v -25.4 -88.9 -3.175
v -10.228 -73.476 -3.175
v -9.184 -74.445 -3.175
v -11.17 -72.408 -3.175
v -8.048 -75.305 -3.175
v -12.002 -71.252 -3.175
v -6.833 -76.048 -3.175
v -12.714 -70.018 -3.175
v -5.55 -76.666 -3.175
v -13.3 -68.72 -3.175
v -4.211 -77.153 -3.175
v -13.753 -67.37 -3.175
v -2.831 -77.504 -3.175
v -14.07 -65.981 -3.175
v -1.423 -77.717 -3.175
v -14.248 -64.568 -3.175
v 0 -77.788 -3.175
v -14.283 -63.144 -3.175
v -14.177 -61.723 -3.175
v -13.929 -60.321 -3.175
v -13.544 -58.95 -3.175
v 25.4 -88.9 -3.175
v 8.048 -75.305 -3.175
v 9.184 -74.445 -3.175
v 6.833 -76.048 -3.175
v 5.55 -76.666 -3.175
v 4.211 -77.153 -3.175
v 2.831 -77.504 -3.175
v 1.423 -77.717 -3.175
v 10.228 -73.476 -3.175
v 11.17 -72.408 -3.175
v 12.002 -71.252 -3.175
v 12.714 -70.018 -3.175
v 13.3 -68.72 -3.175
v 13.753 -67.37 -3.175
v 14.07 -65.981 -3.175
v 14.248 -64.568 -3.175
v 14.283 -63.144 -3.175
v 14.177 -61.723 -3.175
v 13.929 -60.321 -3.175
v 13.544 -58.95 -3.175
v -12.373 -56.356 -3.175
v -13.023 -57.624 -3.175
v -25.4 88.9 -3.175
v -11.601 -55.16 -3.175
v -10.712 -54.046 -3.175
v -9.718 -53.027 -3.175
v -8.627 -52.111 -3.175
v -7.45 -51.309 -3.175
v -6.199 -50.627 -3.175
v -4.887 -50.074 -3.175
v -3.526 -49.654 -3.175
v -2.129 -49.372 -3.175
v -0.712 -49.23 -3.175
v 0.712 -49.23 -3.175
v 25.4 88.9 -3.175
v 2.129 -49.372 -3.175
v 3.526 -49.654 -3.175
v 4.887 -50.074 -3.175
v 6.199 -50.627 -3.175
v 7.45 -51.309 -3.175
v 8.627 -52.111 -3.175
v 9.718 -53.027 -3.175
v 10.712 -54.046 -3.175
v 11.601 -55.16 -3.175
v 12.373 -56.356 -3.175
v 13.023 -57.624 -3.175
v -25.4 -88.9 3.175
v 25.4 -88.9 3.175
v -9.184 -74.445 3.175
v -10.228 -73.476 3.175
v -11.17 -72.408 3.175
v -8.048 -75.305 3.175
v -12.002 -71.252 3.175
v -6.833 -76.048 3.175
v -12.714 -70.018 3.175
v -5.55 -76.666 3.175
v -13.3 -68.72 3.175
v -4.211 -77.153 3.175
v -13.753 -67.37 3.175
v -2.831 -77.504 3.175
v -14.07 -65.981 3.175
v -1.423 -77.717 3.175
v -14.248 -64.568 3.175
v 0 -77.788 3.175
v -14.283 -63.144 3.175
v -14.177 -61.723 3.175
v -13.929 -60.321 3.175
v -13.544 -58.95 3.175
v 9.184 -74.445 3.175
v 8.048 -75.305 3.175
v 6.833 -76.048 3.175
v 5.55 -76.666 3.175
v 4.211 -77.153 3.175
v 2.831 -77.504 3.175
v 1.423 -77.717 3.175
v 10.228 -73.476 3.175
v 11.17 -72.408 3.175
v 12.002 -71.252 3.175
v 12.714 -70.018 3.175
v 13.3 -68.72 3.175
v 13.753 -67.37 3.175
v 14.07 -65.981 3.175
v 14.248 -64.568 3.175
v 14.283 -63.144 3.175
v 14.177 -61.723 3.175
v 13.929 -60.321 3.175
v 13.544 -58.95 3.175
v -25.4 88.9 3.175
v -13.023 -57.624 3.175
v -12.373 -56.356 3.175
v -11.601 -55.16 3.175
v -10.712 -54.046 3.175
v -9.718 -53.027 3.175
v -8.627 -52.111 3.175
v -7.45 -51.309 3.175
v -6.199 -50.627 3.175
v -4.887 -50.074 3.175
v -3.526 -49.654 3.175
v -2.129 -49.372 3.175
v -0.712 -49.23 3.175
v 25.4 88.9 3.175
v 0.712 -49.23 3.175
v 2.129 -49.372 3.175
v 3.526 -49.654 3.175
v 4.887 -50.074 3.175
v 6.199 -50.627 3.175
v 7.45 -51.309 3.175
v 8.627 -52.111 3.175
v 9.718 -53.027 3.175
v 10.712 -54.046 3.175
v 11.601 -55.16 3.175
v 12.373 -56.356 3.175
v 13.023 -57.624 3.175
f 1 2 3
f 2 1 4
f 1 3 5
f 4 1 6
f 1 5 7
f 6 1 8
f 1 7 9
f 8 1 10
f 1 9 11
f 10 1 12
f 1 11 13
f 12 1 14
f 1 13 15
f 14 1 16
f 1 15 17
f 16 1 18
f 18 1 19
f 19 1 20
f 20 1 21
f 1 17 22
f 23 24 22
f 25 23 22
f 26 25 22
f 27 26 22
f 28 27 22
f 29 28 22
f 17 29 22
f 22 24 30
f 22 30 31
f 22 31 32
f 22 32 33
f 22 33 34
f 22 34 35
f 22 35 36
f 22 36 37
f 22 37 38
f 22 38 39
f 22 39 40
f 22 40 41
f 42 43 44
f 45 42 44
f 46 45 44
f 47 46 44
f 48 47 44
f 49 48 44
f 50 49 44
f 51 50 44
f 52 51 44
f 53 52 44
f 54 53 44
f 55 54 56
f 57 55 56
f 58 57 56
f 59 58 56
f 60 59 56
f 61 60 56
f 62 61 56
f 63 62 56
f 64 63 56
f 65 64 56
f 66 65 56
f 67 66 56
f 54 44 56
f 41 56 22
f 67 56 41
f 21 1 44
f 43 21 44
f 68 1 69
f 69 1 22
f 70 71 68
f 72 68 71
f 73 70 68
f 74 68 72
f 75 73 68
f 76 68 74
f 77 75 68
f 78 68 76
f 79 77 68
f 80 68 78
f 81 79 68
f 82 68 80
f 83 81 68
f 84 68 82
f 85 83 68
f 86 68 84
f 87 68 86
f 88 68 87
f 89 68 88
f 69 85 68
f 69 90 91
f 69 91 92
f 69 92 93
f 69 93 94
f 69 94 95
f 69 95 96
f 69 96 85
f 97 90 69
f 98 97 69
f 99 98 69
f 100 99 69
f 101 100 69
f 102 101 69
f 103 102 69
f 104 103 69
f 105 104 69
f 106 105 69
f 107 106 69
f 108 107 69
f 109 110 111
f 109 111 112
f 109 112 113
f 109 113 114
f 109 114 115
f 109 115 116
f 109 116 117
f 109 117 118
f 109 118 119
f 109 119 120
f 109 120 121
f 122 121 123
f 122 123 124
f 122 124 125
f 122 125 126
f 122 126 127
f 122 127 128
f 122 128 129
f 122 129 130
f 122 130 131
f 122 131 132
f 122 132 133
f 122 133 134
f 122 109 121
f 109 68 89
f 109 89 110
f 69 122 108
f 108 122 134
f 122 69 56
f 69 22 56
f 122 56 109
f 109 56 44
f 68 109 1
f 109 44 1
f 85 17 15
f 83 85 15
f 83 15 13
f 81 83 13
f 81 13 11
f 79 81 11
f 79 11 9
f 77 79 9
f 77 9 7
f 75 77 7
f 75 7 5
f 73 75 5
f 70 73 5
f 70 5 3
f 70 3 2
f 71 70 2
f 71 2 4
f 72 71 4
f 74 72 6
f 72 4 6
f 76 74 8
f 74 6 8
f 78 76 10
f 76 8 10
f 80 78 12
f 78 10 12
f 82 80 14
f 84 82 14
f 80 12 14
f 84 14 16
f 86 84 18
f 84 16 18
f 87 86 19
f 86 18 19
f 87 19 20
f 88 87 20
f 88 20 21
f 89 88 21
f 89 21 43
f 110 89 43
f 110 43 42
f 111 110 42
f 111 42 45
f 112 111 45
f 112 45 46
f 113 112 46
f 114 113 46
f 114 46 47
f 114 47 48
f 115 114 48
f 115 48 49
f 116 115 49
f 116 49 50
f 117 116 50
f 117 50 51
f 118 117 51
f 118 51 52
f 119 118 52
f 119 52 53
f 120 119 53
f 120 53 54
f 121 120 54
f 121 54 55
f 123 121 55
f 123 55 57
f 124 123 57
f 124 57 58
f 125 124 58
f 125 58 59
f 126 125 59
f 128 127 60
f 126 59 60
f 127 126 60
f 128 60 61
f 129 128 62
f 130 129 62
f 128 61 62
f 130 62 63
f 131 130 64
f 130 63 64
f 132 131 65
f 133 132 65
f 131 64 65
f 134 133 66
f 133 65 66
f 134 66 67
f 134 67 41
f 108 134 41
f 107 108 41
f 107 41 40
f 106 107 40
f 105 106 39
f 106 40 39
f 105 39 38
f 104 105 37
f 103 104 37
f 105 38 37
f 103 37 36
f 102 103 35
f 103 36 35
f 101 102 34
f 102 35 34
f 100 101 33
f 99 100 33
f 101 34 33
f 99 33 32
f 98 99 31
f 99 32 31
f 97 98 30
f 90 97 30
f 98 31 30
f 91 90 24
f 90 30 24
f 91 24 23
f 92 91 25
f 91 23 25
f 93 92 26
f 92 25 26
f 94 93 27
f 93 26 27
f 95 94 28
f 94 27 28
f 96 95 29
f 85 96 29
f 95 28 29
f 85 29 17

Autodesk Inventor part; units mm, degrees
ref_plane "YZ Plane" through (0, 0, 0) normal (1, 0, 0) x (0, 1, 0)
ref_plane "XZ Plane" through (0, 0, 0) normal (0, 1, 0) x (-1, 0, 0)
ref_plane "XY Plane" through (0, 0, 0) normal (0, 0, 1) x (1, 0, 0)
sketch "Sketch1" plane through (0, 0, 0) normal (0, 0, 1) x (1, 0, 0)
  line L0 (-25.4, -88.9) -> (25.4, -88.9)
  line L1 (25.4, -88.9) -> (25.4, 88.9)
  line L2 (25.4, 88.9) -> (-25.4, 88.9)
  line L3 (-25.4, 88.9) -> (-25.4, -88.9)
  line L4 (-25.4, -88.9) -> (25.4, 88.9) construction
  line L5 (25.4, -88.9) -> (-25.4, 88.9) construction
  point P0 (0, 0)
  dimension "width" = 50.8
  dimension "length" = 177.8
extrude "Extrusion1" add sketch "Sketch1" along normal mid plane 6.35
sketch "Sketch2" plane through (0, 0, 3.175) normal (0, 0, 1) x (1, 0, 0)
  line L0 (-25.4, -88.9) -> (-25.4, 88.9) construction
  line L1 (-25.4, 88.9) -> (25.4, 88.9) construction
  line L2 (25.4, 88.9) -> (25.4, -88.9) construction
  line L3 (25.4, -88.9) -> (-25.4, -88.9) construction
  point P0 (0, 0)
  point P1 (0, -63.5)
  point P2 (0, -88.9)
  dimension "d4" = 25.4
hole "Hole1" at (0, -63.5, 3.175) direction (0, 0, -1) diameter 28.575 end through all
properties part number "CL6-003" material "Aluminum 6061"
